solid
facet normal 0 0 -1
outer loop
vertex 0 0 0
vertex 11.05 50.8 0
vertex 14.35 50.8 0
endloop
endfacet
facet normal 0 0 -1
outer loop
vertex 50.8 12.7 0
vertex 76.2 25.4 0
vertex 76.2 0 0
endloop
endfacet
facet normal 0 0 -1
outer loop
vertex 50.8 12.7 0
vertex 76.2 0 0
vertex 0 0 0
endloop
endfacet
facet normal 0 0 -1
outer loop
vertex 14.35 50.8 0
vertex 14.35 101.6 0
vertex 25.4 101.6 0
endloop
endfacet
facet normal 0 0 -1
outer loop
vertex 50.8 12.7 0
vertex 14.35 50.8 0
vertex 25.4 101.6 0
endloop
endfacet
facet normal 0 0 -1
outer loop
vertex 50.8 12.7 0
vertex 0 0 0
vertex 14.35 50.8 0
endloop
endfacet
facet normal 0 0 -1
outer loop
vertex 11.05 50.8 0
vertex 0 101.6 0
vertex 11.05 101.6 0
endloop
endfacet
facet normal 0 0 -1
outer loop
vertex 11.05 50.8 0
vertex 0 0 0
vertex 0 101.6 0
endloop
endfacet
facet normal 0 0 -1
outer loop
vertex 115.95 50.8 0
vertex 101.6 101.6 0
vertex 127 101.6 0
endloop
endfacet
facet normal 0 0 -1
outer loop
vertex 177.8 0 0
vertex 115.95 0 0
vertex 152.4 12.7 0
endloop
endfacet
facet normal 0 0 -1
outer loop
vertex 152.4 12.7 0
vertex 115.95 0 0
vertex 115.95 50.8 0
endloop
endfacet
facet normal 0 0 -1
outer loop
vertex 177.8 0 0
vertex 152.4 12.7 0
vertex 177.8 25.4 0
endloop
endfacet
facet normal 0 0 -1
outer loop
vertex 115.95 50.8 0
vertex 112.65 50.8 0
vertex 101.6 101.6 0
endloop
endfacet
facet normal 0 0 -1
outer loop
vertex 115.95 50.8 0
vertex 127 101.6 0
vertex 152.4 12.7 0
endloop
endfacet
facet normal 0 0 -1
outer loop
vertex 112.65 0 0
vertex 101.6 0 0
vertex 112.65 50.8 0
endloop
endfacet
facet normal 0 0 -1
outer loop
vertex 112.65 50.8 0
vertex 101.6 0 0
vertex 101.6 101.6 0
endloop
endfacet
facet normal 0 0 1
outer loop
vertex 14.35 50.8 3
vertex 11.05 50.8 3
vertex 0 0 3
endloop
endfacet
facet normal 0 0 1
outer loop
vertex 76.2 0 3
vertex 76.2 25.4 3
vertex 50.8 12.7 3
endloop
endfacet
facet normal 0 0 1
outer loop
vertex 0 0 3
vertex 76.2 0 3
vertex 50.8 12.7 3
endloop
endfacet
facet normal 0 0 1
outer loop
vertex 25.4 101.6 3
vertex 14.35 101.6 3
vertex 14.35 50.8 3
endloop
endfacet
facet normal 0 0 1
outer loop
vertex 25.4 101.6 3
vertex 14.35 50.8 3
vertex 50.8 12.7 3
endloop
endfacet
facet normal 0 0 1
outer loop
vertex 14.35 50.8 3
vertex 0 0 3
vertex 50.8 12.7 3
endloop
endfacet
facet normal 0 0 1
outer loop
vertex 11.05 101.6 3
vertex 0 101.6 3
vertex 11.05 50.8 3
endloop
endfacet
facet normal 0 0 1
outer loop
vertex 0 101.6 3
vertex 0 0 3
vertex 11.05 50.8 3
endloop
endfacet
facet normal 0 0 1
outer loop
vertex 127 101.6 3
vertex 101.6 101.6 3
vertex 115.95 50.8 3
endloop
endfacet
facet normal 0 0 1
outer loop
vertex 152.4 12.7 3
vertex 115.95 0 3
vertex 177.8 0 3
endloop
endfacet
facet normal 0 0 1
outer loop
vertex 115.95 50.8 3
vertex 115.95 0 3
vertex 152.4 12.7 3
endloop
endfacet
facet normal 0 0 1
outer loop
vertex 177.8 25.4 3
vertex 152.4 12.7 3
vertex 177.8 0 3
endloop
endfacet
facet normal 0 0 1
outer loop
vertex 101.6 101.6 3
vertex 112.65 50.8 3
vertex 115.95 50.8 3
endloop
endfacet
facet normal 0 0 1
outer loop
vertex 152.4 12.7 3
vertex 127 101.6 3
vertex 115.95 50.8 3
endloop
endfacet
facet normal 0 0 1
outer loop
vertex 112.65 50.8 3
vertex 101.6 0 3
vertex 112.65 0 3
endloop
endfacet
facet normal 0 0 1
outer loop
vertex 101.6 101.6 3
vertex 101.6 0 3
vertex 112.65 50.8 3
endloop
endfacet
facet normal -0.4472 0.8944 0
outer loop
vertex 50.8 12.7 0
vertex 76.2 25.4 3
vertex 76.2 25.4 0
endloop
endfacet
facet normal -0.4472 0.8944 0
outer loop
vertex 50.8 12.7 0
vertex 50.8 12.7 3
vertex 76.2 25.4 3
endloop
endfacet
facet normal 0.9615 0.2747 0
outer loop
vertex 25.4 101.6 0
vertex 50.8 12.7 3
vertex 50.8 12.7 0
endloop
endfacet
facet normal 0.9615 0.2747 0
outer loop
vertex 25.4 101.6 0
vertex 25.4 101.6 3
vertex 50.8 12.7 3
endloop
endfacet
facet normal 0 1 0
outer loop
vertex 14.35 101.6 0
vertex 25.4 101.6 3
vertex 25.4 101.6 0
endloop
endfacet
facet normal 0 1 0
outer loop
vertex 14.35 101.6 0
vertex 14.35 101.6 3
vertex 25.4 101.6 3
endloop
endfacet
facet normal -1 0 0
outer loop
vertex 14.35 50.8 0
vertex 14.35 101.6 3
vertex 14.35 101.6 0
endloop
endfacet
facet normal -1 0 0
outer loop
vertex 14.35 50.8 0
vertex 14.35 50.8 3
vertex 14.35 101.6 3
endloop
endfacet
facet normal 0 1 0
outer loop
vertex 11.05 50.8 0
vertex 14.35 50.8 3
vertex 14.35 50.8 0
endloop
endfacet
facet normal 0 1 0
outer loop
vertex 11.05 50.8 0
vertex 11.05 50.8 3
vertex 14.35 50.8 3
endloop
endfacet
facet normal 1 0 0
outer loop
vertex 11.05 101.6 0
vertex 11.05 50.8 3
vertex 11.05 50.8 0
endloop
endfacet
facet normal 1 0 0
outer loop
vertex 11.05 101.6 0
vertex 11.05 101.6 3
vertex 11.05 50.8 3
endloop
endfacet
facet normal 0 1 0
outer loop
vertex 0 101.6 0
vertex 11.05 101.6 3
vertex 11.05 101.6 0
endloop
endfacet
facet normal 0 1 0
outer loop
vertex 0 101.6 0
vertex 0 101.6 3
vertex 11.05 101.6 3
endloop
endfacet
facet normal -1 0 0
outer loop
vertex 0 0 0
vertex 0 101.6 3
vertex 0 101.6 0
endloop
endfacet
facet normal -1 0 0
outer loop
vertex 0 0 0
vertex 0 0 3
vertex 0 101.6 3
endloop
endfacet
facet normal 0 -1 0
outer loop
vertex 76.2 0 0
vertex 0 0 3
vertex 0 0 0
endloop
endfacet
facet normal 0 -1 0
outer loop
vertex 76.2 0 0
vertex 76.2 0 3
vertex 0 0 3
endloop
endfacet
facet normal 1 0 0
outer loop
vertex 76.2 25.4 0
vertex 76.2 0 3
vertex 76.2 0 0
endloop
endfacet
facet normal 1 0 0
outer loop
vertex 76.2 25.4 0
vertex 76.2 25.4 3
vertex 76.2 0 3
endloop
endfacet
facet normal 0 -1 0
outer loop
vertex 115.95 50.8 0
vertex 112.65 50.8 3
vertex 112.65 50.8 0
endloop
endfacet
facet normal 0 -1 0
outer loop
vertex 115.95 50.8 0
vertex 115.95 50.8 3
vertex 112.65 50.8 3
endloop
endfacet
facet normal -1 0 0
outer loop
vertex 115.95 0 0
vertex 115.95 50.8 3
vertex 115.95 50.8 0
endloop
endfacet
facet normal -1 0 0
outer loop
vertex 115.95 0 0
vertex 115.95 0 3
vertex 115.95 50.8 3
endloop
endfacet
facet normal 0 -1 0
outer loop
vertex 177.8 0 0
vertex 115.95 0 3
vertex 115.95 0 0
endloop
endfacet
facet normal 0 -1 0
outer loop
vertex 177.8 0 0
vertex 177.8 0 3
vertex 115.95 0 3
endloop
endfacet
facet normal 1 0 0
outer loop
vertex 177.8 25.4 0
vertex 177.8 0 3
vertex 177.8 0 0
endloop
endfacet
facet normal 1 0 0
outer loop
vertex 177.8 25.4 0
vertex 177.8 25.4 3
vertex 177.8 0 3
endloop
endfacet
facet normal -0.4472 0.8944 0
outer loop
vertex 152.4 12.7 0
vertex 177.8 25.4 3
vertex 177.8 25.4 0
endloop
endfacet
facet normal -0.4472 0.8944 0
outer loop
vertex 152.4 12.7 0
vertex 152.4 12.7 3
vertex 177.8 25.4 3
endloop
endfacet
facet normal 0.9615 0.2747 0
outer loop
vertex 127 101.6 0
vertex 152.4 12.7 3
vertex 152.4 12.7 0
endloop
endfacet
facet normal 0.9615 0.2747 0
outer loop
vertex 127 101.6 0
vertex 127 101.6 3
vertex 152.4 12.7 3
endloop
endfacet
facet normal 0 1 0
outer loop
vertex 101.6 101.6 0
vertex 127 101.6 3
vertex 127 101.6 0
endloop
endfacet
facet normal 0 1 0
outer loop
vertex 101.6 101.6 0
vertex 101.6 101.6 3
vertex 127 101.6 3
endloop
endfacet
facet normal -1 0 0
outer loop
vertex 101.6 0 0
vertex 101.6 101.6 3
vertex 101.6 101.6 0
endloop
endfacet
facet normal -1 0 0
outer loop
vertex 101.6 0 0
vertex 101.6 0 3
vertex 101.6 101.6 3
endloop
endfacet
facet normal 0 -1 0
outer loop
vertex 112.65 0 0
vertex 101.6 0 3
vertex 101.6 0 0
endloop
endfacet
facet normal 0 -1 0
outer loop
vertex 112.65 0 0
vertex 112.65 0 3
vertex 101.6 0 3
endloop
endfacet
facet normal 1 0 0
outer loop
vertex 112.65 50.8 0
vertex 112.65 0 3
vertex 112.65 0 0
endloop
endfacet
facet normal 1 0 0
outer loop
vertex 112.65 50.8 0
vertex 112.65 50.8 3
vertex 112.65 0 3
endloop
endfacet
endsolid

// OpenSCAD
// thickness of each slice in mm
THICKNESS = 3;
// How much additional width to allow for the slits
CLEARANCE = 0.3;
// height of the tallest part in inches
HEIGHT = 4;

/* [Hidden] */

INCH = 25.4; // mm

module base() {
  polygon([
    [0, 0],
    [3*INCH, 0],
    [3*INCH, INCH],
    [2*INCH, 0.5 * INCH],
    [INCH, HEIGHT * INCH],
    [0, HEIGHT * INCH],
  ]);
}

module slit() {
  square(
    [THICKNESS + CLEARANCE, 0.5 * HEIGHT * INCH], 
    center=true
  );
}

module top_slit() {
  translate([0.5 * INCH, 0.75 * HEIGHT * INCH])
  slit();
}

module bottom_slit() {
  translate([0.5 * INCH, 0.25 * HEIGHT * INCH])
  slit();
}

module side1() {
  difference() {
      base();
      top_slit();
  }
}

module side2() {
  translate([4 * INCH, 0])
  difference() {
    base();
    bottom_slit();
  }
}

linear_extrude(THICKNESS)
union() { 
  side1();
  side2();
}
